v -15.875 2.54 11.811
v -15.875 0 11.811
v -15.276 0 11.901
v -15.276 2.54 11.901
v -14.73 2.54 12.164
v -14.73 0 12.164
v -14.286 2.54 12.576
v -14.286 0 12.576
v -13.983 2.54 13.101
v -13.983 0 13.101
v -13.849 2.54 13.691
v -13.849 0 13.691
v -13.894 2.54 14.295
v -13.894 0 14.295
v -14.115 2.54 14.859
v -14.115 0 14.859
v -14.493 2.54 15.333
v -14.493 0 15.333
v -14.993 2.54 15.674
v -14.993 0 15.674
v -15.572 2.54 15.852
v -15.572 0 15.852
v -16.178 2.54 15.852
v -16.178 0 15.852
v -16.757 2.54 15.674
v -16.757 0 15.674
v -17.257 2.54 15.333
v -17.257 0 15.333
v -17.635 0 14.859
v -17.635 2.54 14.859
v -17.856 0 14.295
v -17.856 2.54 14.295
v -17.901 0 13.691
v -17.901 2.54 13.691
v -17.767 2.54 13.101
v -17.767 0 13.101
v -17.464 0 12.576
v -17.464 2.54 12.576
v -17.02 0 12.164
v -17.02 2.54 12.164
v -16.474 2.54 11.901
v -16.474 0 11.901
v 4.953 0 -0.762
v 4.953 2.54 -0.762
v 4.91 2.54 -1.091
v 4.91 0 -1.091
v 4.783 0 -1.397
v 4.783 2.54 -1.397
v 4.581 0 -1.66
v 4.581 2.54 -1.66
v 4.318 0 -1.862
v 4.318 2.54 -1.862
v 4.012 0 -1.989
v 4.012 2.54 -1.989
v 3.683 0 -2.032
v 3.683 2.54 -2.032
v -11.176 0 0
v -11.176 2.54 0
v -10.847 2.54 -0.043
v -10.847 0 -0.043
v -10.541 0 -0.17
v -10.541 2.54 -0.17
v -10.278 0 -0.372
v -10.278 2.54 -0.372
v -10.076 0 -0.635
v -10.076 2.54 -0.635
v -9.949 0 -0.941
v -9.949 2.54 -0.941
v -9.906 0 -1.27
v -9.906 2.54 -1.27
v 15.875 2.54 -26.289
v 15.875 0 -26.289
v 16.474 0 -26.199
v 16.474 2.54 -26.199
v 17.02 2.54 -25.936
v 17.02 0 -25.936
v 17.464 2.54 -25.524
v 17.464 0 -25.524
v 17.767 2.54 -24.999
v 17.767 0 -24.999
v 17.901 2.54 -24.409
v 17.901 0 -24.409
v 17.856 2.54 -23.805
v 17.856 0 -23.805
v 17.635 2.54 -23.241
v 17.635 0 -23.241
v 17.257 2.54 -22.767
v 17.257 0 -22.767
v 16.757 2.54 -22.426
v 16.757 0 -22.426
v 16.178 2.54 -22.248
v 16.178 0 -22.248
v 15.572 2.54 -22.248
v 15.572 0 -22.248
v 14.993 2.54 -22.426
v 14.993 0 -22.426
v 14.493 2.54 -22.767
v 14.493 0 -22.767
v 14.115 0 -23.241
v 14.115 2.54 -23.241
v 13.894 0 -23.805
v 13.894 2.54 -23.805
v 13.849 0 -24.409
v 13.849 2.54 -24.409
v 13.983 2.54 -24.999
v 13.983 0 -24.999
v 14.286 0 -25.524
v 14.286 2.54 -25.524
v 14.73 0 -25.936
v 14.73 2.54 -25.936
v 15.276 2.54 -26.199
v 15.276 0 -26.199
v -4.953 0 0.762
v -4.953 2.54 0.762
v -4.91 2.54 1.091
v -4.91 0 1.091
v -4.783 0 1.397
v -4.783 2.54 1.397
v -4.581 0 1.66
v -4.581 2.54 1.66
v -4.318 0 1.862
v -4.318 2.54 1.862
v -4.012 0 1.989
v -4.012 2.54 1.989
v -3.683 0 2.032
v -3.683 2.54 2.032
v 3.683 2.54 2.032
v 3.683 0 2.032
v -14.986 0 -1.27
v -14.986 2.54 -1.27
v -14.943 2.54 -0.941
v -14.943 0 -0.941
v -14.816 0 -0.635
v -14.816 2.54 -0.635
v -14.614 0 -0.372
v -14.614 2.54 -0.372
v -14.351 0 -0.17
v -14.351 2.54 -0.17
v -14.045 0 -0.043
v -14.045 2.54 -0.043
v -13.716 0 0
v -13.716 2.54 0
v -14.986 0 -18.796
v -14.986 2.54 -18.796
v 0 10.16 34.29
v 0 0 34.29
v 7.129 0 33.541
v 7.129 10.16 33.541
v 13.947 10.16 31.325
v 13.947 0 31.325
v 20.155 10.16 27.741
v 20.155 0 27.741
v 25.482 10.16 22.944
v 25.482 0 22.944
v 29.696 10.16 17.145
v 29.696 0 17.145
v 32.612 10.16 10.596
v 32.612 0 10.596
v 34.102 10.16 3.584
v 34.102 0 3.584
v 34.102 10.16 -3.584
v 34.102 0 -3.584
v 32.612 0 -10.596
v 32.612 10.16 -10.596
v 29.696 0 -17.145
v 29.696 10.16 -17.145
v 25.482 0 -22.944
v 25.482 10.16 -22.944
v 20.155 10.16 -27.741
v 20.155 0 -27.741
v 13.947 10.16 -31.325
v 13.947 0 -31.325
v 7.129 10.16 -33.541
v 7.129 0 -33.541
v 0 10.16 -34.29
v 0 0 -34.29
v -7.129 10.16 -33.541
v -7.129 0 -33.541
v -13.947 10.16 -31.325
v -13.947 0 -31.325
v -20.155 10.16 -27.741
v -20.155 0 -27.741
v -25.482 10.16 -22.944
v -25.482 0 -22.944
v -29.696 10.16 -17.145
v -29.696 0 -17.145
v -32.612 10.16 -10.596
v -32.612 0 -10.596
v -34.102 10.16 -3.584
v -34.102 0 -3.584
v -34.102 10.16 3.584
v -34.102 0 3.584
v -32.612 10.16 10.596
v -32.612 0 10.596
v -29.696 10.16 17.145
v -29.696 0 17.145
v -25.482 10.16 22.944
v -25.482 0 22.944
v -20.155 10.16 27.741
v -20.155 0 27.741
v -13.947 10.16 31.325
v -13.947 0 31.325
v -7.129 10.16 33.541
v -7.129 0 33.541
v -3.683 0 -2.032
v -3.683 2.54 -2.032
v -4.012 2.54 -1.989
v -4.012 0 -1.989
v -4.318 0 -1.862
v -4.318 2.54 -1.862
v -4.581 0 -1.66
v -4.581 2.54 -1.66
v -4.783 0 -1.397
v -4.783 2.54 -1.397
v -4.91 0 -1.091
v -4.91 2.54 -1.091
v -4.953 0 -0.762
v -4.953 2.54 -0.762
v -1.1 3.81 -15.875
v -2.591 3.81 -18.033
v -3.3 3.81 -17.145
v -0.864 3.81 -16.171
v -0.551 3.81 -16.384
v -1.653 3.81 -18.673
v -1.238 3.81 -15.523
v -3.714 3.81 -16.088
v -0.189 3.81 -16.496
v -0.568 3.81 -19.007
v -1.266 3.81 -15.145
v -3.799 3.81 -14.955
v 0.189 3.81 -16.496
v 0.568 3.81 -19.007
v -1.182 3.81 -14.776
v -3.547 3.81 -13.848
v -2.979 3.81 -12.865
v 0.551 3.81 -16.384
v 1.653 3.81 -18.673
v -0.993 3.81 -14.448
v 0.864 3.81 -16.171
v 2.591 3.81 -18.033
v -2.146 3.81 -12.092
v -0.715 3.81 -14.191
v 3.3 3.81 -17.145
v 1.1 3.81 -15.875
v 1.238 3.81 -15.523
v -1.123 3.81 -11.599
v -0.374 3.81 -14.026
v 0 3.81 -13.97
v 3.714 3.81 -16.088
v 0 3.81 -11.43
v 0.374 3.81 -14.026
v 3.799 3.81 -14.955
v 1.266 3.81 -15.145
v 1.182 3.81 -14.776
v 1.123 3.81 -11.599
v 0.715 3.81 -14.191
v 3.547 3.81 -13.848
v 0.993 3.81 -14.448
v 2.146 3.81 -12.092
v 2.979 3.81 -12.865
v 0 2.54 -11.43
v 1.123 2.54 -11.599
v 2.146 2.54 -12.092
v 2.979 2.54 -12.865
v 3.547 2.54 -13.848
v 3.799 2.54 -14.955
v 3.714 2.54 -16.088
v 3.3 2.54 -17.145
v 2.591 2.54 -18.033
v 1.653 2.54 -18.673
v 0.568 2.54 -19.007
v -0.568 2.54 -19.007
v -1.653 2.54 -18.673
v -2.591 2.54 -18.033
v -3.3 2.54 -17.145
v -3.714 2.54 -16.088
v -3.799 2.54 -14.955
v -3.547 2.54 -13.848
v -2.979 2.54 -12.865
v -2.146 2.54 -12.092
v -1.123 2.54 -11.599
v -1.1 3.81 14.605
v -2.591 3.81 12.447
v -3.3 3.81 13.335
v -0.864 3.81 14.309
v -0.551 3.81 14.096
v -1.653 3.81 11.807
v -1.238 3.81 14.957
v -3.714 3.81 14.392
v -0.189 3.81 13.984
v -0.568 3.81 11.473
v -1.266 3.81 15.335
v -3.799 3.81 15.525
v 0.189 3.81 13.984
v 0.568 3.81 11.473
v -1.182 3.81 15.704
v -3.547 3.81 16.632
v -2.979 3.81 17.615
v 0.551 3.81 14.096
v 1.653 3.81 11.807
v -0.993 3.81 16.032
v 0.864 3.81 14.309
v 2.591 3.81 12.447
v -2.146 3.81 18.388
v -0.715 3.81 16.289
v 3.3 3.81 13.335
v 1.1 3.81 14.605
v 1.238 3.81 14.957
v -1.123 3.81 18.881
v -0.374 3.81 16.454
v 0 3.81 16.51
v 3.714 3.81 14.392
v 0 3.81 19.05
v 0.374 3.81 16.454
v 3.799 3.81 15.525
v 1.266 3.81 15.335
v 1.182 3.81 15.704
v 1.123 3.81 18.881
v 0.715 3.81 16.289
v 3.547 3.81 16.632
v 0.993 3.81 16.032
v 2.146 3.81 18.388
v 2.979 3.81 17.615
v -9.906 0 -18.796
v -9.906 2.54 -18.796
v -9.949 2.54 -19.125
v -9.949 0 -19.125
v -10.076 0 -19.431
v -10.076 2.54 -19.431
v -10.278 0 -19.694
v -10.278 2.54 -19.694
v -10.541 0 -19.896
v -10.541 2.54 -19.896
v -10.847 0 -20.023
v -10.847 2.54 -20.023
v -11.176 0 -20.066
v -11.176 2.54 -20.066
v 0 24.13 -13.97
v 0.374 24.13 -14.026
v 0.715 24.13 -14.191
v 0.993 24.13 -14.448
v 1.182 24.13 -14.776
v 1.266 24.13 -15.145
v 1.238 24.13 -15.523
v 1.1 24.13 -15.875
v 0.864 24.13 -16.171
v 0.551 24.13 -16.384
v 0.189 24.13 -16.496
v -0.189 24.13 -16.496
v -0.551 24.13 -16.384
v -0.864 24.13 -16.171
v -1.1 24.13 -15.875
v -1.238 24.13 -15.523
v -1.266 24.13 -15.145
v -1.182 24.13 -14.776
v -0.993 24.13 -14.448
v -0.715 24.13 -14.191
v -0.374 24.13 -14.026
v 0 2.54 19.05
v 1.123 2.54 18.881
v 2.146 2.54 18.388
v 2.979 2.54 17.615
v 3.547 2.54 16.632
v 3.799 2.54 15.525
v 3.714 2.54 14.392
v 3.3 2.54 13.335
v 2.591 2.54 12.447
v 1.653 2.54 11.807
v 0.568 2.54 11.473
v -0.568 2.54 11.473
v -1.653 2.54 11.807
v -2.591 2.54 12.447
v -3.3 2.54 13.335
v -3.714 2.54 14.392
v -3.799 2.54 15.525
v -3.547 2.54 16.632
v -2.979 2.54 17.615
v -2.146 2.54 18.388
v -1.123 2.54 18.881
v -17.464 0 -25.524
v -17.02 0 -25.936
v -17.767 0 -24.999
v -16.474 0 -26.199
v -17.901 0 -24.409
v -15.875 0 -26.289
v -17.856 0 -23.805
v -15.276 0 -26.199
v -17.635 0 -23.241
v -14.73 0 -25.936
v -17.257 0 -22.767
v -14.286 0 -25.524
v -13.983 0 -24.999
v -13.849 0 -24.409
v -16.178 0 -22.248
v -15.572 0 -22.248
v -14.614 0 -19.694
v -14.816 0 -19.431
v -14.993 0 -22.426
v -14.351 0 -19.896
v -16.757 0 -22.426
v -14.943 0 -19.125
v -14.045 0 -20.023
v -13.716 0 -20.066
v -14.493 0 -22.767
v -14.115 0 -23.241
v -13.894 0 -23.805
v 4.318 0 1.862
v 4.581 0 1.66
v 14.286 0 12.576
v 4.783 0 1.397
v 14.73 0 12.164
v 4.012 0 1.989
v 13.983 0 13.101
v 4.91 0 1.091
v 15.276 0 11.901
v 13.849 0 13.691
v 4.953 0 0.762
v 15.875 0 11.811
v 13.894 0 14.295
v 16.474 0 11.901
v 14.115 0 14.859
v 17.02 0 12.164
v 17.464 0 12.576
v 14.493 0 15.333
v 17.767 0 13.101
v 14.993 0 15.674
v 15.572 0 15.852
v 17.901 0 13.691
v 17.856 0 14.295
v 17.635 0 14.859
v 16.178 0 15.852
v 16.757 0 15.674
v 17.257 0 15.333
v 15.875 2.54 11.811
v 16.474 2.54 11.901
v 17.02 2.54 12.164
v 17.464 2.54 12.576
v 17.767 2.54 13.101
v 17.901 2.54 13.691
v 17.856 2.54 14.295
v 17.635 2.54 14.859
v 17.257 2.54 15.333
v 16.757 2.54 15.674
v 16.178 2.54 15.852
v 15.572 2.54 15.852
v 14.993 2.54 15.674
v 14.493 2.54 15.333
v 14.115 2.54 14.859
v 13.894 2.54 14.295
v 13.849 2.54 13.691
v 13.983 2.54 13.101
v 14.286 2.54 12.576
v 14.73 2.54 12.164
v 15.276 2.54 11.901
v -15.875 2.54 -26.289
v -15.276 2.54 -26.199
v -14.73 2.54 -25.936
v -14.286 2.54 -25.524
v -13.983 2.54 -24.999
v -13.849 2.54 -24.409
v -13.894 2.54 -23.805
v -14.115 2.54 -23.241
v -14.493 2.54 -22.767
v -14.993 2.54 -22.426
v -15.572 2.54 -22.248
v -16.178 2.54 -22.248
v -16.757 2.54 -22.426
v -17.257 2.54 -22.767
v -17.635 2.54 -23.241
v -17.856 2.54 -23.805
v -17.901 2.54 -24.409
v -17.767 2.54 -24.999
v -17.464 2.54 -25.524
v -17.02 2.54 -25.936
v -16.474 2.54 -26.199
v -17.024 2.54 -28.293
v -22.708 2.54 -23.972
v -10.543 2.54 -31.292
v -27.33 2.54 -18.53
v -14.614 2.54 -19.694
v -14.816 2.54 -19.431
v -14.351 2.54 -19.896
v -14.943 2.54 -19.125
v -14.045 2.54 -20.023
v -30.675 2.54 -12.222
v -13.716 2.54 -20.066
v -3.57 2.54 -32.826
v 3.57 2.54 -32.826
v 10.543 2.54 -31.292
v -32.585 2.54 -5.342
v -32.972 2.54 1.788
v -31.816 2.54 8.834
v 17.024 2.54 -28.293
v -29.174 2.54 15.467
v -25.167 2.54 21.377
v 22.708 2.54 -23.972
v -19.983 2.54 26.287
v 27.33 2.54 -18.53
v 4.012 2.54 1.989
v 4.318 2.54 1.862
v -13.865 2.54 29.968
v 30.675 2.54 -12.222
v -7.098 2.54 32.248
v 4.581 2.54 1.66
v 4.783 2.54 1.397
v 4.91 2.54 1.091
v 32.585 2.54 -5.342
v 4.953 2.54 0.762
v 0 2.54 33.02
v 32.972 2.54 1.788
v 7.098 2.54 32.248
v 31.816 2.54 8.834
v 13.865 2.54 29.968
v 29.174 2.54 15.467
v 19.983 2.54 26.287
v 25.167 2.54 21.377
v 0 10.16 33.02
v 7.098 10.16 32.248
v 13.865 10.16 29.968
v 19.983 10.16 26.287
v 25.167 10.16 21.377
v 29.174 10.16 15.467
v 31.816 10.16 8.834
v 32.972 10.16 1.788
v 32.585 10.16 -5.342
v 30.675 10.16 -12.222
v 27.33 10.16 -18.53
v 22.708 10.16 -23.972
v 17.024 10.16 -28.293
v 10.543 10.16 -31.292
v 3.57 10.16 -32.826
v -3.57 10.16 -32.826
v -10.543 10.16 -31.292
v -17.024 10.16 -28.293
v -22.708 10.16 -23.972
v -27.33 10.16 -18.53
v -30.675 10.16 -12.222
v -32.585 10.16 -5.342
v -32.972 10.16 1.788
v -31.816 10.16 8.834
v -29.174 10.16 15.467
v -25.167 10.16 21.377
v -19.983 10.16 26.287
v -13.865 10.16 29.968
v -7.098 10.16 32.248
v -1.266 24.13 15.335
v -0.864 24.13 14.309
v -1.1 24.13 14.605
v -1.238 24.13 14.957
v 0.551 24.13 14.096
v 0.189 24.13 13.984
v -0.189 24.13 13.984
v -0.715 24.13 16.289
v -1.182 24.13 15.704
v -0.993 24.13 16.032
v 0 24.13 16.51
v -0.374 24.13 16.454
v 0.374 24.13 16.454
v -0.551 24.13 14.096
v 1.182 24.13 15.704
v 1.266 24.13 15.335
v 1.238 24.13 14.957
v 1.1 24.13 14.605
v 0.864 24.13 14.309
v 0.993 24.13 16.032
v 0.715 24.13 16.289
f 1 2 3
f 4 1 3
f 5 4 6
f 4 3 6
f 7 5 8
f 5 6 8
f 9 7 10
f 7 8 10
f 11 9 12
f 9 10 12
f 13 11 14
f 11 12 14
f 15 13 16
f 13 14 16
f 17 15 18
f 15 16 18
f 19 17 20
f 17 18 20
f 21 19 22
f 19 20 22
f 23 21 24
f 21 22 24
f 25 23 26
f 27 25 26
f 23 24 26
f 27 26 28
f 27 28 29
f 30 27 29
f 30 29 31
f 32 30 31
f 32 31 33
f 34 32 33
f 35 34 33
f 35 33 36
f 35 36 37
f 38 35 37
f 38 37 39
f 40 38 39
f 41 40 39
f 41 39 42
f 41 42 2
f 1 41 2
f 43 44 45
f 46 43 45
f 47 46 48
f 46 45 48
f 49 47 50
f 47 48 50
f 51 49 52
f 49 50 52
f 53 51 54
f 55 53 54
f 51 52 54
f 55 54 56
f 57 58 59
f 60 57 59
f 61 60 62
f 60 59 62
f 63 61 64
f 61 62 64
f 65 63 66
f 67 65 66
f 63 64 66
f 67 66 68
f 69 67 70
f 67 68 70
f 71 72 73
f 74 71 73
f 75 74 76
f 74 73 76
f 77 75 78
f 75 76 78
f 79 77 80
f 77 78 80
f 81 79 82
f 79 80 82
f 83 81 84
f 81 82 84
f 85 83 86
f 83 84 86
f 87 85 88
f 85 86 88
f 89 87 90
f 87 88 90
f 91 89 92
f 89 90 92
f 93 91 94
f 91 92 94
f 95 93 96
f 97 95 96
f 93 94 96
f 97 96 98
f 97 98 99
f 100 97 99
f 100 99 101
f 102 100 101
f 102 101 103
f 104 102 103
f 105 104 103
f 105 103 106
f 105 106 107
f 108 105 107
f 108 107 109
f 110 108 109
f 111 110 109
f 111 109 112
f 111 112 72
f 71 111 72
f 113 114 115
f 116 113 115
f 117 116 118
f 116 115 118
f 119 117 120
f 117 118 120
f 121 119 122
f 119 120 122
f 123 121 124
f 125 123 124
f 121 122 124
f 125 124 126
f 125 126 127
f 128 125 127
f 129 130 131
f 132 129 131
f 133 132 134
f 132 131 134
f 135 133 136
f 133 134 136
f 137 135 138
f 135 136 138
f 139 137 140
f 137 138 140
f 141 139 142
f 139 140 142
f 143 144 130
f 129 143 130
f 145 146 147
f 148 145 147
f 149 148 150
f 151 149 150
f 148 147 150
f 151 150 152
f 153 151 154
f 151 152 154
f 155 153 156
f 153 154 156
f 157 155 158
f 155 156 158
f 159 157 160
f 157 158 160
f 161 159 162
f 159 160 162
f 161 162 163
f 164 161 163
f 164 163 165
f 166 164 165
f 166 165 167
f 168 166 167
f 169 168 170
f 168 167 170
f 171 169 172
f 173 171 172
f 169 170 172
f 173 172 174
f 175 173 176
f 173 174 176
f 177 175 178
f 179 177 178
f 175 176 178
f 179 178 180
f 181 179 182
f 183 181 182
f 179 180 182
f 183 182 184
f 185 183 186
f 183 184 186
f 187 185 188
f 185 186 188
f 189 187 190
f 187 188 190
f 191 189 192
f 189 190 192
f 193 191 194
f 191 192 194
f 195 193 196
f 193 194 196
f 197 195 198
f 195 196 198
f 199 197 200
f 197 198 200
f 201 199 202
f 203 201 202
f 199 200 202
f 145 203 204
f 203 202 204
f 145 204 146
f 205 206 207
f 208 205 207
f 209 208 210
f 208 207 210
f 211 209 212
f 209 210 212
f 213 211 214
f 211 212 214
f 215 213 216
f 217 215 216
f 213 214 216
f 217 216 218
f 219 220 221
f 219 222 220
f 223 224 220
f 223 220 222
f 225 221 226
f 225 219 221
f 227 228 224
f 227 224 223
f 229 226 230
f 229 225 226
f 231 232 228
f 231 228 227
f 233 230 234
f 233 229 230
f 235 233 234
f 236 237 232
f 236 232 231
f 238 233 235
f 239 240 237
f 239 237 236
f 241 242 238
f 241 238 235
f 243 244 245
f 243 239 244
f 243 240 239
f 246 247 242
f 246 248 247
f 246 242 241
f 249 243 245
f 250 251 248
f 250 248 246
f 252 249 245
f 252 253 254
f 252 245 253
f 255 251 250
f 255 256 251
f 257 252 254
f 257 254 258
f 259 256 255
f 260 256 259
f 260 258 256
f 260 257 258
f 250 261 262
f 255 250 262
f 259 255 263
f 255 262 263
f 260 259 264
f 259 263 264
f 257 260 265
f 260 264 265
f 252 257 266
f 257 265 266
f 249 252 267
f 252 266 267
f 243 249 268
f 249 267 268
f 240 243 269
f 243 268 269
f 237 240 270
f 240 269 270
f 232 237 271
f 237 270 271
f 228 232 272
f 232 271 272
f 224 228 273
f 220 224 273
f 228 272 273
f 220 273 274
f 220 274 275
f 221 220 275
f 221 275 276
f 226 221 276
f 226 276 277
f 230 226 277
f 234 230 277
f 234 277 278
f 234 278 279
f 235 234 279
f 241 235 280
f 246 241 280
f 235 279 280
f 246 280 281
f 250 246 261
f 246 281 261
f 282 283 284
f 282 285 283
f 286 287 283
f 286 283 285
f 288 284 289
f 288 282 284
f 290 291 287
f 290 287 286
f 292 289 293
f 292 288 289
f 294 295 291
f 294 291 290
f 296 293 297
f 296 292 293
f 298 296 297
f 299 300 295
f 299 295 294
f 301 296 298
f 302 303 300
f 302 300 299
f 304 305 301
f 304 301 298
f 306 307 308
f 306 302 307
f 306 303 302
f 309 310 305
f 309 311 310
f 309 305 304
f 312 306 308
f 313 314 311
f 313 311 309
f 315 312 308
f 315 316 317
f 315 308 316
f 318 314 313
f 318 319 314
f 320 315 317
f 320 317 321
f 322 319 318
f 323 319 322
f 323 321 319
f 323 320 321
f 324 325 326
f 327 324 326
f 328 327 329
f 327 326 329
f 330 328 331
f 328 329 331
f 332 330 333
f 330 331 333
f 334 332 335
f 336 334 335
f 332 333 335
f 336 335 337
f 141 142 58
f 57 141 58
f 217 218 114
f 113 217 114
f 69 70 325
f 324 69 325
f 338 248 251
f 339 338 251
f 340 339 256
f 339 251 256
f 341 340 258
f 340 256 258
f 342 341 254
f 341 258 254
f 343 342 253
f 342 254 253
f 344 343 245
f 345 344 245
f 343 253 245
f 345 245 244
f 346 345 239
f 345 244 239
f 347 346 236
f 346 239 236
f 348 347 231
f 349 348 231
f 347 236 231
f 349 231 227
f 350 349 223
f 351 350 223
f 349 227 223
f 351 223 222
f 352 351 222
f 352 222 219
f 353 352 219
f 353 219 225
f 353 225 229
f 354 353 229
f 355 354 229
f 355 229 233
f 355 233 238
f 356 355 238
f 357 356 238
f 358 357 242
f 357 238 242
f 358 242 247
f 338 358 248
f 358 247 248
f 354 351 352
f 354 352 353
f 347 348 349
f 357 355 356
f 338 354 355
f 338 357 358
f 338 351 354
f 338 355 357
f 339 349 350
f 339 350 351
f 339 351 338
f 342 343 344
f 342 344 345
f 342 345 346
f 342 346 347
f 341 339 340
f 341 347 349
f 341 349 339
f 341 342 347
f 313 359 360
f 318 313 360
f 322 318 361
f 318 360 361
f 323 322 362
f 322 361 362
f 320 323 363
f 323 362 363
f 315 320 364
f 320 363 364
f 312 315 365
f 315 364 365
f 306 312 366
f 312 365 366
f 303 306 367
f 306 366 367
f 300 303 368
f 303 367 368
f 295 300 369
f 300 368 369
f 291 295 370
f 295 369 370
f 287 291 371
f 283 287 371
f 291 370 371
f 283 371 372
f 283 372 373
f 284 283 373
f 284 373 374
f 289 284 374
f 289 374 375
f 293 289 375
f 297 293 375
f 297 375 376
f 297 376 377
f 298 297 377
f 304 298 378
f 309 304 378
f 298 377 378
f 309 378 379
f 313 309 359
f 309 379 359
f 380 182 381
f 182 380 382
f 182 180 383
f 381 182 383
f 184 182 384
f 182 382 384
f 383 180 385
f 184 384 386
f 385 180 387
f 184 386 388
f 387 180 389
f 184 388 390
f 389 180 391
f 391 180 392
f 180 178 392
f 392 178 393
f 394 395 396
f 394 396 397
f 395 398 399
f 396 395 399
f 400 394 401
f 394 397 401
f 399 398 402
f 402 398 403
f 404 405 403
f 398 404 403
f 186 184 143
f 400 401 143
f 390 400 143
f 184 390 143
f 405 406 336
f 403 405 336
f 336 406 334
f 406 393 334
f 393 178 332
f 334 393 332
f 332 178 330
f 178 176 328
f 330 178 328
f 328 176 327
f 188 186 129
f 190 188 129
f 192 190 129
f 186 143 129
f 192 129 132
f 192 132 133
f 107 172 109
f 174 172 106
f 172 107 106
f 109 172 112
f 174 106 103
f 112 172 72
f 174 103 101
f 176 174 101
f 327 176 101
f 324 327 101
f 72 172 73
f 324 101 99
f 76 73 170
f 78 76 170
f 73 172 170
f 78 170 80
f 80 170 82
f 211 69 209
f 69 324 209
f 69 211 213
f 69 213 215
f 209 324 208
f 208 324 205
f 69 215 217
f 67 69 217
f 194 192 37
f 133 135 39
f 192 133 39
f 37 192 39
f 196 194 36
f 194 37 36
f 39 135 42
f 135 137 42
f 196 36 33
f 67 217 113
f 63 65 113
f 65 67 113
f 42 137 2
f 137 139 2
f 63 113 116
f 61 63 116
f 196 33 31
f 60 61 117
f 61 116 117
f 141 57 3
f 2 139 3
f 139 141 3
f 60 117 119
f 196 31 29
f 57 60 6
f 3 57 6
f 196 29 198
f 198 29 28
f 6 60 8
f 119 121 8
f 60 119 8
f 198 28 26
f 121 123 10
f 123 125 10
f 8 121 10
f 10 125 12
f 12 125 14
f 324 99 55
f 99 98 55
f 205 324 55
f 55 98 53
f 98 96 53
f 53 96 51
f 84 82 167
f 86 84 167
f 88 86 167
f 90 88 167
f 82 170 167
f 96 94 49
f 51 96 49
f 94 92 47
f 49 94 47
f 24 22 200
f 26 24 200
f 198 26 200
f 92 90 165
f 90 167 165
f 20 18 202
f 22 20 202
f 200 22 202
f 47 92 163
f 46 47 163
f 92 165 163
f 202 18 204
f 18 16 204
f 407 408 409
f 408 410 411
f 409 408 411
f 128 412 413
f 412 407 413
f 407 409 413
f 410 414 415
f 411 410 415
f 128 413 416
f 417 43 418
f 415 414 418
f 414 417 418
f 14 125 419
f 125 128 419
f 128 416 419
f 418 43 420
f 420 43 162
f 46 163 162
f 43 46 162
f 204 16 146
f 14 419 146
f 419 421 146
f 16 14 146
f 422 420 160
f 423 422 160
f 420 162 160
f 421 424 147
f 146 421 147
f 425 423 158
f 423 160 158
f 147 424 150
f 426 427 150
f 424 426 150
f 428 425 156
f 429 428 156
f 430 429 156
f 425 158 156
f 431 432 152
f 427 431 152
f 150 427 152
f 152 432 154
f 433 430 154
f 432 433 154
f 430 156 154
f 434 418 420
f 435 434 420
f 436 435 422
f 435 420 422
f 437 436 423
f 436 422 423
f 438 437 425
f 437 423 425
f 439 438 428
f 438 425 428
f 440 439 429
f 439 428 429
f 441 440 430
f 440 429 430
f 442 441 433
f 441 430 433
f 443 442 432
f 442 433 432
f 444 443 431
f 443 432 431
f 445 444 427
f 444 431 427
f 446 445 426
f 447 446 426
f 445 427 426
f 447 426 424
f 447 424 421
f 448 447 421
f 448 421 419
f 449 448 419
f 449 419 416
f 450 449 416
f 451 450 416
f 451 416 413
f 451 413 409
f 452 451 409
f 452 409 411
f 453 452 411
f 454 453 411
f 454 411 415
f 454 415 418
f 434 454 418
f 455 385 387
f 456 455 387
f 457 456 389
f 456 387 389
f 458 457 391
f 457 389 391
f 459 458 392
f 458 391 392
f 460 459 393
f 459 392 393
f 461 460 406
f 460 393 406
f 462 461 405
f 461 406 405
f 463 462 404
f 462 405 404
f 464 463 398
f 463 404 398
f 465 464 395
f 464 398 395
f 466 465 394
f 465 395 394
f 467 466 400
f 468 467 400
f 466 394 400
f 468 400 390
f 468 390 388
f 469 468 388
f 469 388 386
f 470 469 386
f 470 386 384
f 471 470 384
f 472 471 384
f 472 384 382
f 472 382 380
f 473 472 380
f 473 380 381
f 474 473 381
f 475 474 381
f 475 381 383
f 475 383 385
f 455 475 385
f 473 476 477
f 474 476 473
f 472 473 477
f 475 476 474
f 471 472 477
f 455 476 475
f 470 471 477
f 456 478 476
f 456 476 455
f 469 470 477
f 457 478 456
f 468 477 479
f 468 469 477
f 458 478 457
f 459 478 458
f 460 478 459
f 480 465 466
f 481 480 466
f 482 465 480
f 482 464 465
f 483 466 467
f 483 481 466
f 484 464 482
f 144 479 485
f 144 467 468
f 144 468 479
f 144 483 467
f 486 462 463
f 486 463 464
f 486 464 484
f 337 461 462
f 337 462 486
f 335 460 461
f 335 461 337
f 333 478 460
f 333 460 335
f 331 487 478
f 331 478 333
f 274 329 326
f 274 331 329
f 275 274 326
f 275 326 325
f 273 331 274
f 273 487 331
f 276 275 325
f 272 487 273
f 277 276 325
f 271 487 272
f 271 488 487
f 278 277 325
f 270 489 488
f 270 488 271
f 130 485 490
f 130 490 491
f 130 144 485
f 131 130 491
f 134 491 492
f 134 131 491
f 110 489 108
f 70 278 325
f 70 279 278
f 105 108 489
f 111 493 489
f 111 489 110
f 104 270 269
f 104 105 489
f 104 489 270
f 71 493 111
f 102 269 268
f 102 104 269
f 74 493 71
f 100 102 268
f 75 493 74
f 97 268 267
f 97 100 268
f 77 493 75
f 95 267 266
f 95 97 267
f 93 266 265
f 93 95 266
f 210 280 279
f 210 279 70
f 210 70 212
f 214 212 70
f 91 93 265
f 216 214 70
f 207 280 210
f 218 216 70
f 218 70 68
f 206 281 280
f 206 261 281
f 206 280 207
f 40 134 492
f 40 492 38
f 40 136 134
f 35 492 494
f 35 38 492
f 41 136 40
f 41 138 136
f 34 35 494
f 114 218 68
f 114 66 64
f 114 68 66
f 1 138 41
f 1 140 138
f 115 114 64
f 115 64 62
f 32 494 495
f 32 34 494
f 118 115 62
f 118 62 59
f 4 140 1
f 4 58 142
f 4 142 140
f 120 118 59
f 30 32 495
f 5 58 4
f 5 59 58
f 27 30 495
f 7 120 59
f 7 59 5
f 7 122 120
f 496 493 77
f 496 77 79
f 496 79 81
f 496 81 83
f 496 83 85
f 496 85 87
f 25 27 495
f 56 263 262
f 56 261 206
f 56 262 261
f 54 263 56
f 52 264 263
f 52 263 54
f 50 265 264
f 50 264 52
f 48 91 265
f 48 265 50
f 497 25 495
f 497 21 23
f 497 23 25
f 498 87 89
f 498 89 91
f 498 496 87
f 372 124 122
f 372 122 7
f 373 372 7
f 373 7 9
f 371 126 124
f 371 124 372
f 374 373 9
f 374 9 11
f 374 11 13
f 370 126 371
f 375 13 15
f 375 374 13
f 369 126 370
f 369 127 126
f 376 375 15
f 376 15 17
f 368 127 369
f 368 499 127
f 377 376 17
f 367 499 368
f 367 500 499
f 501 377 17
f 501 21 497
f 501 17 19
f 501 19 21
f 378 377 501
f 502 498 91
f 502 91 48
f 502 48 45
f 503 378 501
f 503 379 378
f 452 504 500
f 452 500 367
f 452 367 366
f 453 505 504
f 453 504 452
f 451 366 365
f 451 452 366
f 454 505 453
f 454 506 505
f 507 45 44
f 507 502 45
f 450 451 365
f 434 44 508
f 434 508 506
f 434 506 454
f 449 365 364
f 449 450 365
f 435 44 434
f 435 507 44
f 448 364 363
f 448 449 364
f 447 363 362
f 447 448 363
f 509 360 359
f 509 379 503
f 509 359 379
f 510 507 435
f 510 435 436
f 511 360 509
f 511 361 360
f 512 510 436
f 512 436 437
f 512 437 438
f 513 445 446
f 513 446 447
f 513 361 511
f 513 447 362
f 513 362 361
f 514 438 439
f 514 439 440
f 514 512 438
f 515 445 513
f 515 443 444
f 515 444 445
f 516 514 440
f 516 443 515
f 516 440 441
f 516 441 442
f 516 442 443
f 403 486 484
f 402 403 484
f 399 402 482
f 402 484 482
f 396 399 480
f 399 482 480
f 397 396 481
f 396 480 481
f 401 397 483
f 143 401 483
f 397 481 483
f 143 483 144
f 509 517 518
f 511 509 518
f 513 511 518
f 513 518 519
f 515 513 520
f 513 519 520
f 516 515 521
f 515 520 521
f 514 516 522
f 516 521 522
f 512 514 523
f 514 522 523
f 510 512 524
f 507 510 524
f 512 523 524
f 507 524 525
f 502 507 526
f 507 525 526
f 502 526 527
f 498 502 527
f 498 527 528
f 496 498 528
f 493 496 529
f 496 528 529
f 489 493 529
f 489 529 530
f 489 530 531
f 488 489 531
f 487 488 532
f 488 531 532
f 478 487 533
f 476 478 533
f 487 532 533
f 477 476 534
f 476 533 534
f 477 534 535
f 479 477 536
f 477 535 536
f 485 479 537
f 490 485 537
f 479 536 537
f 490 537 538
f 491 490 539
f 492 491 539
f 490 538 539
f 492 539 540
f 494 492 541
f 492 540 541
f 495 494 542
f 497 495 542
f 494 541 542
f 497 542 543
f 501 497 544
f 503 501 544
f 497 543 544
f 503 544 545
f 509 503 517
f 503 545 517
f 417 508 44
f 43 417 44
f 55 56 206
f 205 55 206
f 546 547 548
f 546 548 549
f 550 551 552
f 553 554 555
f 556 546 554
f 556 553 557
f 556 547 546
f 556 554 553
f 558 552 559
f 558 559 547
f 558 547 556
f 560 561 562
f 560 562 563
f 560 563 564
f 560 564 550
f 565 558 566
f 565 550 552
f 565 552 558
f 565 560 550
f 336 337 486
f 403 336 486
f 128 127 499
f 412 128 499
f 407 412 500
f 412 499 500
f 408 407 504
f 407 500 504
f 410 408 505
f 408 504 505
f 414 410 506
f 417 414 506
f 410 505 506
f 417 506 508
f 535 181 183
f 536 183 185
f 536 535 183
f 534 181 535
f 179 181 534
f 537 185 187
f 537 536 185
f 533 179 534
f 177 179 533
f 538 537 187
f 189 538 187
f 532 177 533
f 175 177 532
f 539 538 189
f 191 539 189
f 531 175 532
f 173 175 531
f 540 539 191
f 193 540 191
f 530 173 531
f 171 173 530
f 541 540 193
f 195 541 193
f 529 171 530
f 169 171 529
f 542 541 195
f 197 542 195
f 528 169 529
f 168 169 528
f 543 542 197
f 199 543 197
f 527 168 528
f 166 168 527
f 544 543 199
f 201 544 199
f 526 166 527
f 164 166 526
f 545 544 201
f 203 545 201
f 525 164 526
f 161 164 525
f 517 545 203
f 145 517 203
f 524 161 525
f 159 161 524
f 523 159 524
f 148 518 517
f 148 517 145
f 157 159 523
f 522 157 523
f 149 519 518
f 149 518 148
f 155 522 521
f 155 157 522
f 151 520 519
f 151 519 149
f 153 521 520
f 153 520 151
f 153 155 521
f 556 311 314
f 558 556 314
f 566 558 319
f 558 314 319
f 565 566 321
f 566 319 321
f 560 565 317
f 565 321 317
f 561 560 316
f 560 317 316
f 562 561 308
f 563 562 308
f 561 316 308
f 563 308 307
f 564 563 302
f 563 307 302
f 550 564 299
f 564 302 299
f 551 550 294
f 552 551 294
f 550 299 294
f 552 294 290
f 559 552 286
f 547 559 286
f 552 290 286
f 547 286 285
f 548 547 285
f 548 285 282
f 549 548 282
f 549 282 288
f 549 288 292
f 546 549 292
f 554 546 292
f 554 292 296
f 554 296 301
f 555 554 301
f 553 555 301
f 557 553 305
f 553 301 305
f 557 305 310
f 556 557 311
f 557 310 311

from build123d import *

# Parameters (mm, degrees)
SKETCH1_R           = 34.29
BOSS_EXTRUDE1_DEPTH = 10.16
SKETCH2_R           = 33.02
CUT_EXTRUDE1_DEPTH  = 7.62
SKETCH3_R           = 3.81
BOSS_EXTRUDE2_DEPTH = 1.27
SKETCH4_R           = 1.27
BOSS_EXTRUDE3_DEPTH = 20.32
CUT_EXTRUDE3_REACH  = 55.082
CUT_EXTRUDE4_REACH  = 55.082
CUT_EXTRUDE5_REACH  = 56.165
SKETCH11_R          = 2.032


with BuildPart() as part:
    # Sketch1 → Boss-Extrude1 (new body)
    with BuildSketch(Plane(origin=(0, 0, 0), x_dir=(1, 0, 0), z_dir=(0, 1, 0))):
        with Locations(Location((0, 0, 0), (0, 0, 270))):
            Circle(SKETCH1_R)
    extrude(amount=BOSS_EXTRUDE1_DEPTH)

    # Sketch2 → Cut-Extrude1 (cut)
    with BuildSketch(Plane(origin=(0, 10.16, 0), x_dir=(1, 0, 0), z_dir=(0, 1, 0))):
        with Locations(Location((0, 0, 0), (0, 0, 270))):
            Circle(SKETCH2_R)
    extrude(amount=-CUT_EXTRUDE1_DEPTH, mode=Mode.SUBTRACT)

    # Sketch3 → Boss-Extrude2 (add)
    with BuildSketch(Plane(origin=(0, 2.54, 0), x_dir=(1, 0, 0), z_dir=(0, 1, 0))):
        with Locations(Location((0, -15.24, 0), (0, 0, 270))):
            Circle(SKETCH3_R)
        with Locations(Location((0, 15.24, 0), (0, 0, 270))):
            Circle(SKETCH3_R)
    extrude(amount=BOSS_EXTRUDE2_DEPTH)

    # Sketch4 → Boss-Extrude3 (add)
    with BuildSketch(Plane(origin=(0, 3.81, 0), x_dir=(1, 0, 0), z_dir=(0, 1, 0))):
        with Locations(Location((0, -15.24, 0), (0, 0, 270))):
            Circle(SKETCH4_R)
        with Locations(Location((0, 15.24, 0), (0, 0, 270))):
            Circle(SKETCH4_R)
    extrude(amount=BOSS_EXTRUDE3_DEPTH)

    # Sketch8 → Cut-Extrude3 (cut, up to next)
    with BuildSketch(Plane(origin=(0, 2.54, 0), x_dir=(1, 0, 0), z_dir=(0, 1, 0)), mode=Mode.PRIVATE) as cut_extrude3_sk1:
        with BuildLine():
            Line((3.683, 2.032), (-3.683, 2.032))
            ThreePointArc((-3.683, 2.032), (-4.581025612, 1.660025612), (-4.953, 0.762))
            Line((-4.953, 0.762), (-4.953, -0.762))
            ThreePointArc((-4.953, -0.762), (-4.581025612, -1.660025612), (-3.683, -2.032))
            Line((-3.683, -2.032), (3.683, -2.032))
            ThreePointArc((3.683, -2.032), (4.581025612, -1.660025612), (4.953, -0.762))
            Line((4.953, -0.762), (4.953, 0.762))
            ThreePointArc((4.953, 0.762), (4.581025612, 1.660025612), (3.683, 2.032))
        make_face()
    cut_extrude3_tool1 = extrude(cut_extrude3_sk1.sketch, amount=-CUT_EXTRUDE3_REACH, mode=Mode.PRIVATE) & part.part
    add(cut_extrude3_tool1.solids().sort_by_distance((0, 2.54, 0))[0], mode=Mode.SUBTRACT)

    # Sketch9 → Cut-Extrude4 (cut, up to next)
    with BuildSketch(Plane(origin=(0, 2.54, 0), x_dir=(1, 0, 0), z_dir=(0, 1, 0)), mode=Mode.PRIVATE) as cut_extrude4_sk1:
        with BuildLine():
            Line((-13.716, 0), (-11.176, 0))
            ThreePointArc((-11.176, 0), (-10.277974388, 0.371974388), (-9.906, 1.27))
            Line((-9.906, 1.27), (-9.906, 18.796))
            ThreePointArc((-9.906, 18.796), (-10.277974388, 19.694025612), (-11.176, 20.066))
            Line((-11.176, 20.066), (-13.716, 20.066))
            ThreePointArc((-13.716, 20.066), (-14.614025612, 19.694025612), (-14.986, 18.796))
            Line((-14.986, 18.796), (-14.986, 1.27))
            ThreePointArc((-14.986, 1.27), (-14.614025612, 0.371974388), (-13.716, 0))
        make_face()
    cut_extrude4_tool1 = extrude(cut_extrude4_sk1.sketch, amount=-CUT_EXTRUDE4_REACH, mode=Mode.PRIVATE) & part.part
    add(cut_extrude4_tool1.solids().sort_by_distance((-12.446, 2.54, -10.033))[0], mode=Mode.SUBTRACT)

    # Sketch11 → Cut-Extrude5 (cut, up to next)
    with BuildSketch(Plane.XZ, mode=Mode.PRIVATE) as cut_extrude5_sk1:
        with Locations(Location((15.875, 13.843, 0), (0, 0, 270))):
            Circle(SKETCH11_R)
    cut_extrude5_tool1 = extrude(cut_extrude5_sk1.sketch, amount=-CUT_EXTRUDE5_REACH, mode=Mode.PRIVATE) & part.part
    # Sketch11 → Cut-Extrude5 (cut, up to next)
    with BuildSketch(Plane.XZ, mode=Mode.PRIVATE) as cut_extrude5_sk2:
        with Locations(Location((-15.875, 13.843, 0), (0, 0, 270))):
            Circle(SKETCH11_R)
    cut_extrude5_tool2 = extrude(cut_extrude5_sk2.sketch, amount=-CUT_EXTRUDE5_REACH, mode=Mode.PRIVATE) & part.part
    # Sketch11 → Cut-Extrude5 (cut, up to next)
    with BuildSketch(Plane.XZ, mode=Mode.PRIVATE) as cut_extrude5_sk3:
        with Locations(Location((-15.875, -24.257, 0), (0, 0, 270))):
            Circle(SKETCH11_R)
    cut_extrude5_tool3 = extrude(cut_extrude5_sk3.sketch, amount=-CUT_EXTRUDE5_REACH, mode=Mode.PRIVATE) & part.part
    # Sketch11 → Cut-Extrude5 (cut, up to next)
    with BuildSketch(Plane.XZ, mode=Mode.PRIVATE) as cut_extrude5_sk4:
        with Locations(Location((15.875, -24.257, 0), (0, 0, 270))):
            Circle(SKETCH11_R)
    cut_extrude5_tool4 = extrude(cut_extrude5_sk4.sketch, amount=-CUT_EXTRUDE5_REACH, mode=Mode.PRIVATE) & part.part
    add(cut_extrude5_tool1.solids().sort_by_distance((15.875, 0, 13.843))[0], mode=Mode.SUBTRACT)
    add(cut_extrude5_tool2.solids().sort_by_distance((-15.875, 0, 13.843))[0], mode=Mode.SUBTRACT)
    add(cut_extrude5_tool3.solids().sort_by_distance((-15.875, 0, -24.257))[0], mode=Mode.SUBTRACT)
    add(cut_extrude5_tool4.solids().sort_by_distance((15.875, 0, -24.257))[0], mode=Mode.SUBTRACT)


solid = part.part
